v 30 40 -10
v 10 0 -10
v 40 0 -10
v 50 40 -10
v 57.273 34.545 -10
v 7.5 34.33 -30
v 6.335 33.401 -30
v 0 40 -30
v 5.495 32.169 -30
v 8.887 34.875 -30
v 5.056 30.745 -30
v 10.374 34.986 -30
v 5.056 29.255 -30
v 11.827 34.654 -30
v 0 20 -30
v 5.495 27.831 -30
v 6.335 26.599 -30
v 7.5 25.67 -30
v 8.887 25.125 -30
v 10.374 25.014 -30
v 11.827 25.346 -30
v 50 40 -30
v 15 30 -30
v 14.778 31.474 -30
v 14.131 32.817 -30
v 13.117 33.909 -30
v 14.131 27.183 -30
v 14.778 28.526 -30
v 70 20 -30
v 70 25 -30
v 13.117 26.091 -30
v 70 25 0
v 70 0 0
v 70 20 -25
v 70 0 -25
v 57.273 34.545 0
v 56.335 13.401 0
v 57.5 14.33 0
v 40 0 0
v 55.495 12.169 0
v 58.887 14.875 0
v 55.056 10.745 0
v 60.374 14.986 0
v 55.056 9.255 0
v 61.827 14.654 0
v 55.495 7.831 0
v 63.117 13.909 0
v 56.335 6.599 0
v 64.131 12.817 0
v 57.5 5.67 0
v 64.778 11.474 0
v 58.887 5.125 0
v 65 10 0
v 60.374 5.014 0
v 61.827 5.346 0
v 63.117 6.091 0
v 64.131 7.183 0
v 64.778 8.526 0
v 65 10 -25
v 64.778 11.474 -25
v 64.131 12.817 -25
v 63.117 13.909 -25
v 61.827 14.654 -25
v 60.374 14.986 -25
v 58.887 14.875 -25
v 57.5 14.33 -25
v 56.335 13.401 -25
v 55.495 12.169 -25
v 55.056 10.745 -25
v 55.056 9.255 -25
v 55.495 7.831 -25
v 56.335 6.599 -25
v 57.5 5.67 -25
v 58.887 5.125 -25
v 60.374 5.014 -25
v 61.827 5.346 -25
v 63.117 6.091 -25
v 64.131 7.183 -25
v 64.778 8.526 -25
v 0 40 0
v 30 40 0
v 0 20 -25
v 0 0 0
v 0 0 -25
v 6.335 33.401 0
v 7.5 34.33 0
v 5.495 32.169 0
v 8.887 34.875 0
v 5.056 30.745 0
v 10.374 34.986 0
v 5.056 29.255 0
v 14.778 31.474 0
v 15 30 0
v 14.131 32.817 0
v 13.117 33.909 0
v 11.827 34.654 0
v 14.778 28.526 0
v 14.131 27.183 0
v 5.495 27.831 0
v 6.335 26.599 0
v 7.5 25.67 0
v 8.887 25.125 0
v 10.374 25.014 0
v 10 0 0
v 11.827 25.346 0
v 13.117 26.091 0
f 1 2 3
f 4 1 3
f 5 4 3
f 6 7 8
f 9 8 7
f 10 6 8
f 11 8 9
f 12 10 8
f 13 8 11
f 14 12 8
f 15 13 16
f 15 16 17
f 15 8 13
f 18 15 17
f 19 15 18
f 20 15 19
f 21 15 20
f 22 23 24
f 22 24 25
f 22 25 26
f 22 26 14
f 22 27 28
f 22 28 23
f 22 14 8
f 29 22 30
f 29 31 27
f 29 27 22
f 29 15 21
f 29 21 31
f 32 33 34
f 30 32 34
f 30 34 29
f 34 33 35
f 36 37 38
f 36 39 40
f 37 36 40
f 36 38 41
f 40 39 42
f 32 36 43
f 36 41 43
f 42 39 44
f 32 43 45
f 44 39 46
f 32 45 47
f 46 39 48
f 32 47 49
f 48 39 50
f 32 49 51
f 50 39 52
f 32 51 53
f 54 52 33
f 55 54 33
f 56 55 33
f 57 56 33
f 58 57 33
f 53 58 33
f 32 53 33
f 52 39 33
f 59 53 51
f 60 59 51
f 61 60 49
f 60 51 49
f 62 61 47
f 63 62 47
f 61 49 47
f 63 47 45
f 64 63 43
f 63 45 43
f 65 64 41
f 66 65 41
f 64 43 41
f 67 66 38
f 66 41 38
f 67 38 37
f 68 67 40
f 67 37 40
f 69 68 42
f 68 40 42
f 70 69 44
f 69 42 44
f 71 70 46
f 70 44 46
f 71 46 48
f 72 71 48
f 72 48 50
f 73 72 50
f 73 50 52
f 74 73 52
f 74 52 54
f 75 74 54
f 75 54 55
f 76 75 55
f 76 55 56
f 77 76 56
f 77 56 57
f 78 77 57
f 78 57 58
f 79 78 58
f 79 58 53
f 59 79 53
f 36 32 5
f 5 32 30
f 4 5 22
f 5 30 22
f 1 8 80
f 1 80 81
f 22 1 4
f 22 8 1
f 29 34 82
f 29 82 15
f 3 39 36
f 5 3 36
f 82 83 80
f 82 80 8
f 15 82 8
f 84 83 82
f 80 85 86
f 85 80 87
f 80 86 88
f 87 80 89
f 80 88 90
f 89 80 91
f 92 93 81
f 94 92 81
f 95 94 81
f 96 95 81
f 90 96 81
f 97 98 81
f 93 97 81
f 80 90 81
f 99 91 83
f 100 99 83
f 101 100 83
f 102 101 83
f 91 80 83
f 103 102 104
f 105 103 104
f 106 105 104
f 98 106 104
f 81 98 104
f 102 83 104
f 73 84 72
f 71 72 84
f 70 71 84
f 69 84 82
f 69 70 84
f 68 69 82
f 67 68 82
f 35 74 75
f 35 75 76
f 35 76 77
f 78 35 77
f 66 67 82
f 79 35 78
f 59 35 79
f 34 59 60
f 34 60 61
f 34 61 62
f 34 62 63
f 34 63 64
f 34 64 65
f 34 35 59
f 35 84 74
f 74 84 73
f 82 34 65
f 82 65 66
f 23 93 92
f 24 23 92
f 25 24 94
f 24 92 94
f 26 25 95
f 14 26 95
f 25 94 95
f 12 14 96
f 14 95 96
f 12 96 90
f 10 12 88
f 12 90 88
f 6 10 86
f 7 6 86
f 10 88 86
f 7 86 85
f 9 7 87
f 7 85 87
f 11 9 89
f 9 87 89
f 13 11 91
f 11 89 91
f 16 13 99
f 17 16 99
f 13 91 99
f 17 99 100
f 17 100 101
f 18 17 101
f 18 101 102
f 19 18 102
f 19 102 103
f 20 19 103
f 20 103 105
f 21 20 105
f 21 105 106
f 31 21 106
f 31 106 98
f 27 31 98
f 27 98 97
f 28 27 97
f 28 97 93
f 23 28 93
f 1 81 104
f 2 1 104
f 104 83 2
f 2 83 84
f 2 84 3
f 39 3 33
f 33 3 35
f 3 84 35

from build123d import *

# Parameters (mm, degrees)
SKETCH1_W               = 70
SKETCH1_H               = 30
BOSS_EXTRUDE1_DEPTH     = 40
CUT_EXTRUDE1_DEPTH      = 10
CUT_EXTRUDE2_DEPTH      = 1
CUT_EXTRUDE2_DEPTH_BACK = 31
SKETCH4_W               = 5
SKETCH4_H               = 20
CUT_EXTRUDE3_DEPTH      = 71
SKETCH5_R               = 5
CUT_EXTRUDE4_DEPTH      = 31
SKETCH6_R               = 5
CUT_EXTRUDE5_DEPTH      = 31


with BuildPart() as part:
    # Sketch1 → Boss-Extrude1 (new body)
    with BuildSketch(Plane(origin=(0, 0, 0), x_dir=(1, 0, 0), z_dir=(0, 1, 0))):
        with Locations((35, 15)):
            Rectangle(SKETCH1_W, SKETCH1_H)
    extrude(amount=BOSS_EXTRUDE1_DEPTH)

    # Sketch2 → Cut-Extrude1 (cut)
    with BuildSketch(Plane.XY):
        Polygon((30, 40), (10, 0), (40, 0), (60, 40), align=None)
    extrude(amount=-CUT_EXTRUDE1_DEPTH, mode=Mode.SUBTRACT)

    # Sketch3 → Cut-Extrude2 (cut, two sides)
    with BuildSketch(Plane(origin=(0, 0, -30), x_dir=(-1, 0, 0), z_dir=(0, 0, -1))) as cut_extrude2_sk:
        Polygon((-70, 40), (-70, 25), (-50, 40), align=None)
    extrude(amount=CUT_EXTRUDE2_DEPTH, mode=Mode.SUBTRACT)
    extrude(cut_extrude2_sk.sketch, amount=-CUT_EXTRUDE2_DEPTH_BACK, mode=Mode.SUBTRACT)

    # Sketch4 → Cut-Extrude3 (cut, through all)
    with BuildSketch(Plane(origin=(70, 0, 0), x_dir=(0, 0, -1), z_dir=(1, 0, 0))):
        with Locations((27.5, 10)):
            Rectangle(SKETCH4_W, SKETCH4_H)
    extrude(amount=-CUT_EXTRUDE3_DEPTH, mode=Mode.SUBTRACT)

    # Sketch5 → Cut-Extrude4 (cut, through all)
    with BuildSketch(Plane.XY):
        with Locations((60, 10)):
            Circle(SKETCH5_R)
    extrude(amount=-CUT_EXTRUDE4_DEPTH, mode=Mode.SUBTRACT)

    # Sketch6 → Cut-Extrude5 (cut, through all)
    with BuildSketch(Plane.XY):
        with Locations((10, 30)):
            Circle(SKETCH6_R)
    extrude(amount=-CUT_EXTRUDE5_DEPTH, mode=Mode.SUBTRACT)


solid = part.part
